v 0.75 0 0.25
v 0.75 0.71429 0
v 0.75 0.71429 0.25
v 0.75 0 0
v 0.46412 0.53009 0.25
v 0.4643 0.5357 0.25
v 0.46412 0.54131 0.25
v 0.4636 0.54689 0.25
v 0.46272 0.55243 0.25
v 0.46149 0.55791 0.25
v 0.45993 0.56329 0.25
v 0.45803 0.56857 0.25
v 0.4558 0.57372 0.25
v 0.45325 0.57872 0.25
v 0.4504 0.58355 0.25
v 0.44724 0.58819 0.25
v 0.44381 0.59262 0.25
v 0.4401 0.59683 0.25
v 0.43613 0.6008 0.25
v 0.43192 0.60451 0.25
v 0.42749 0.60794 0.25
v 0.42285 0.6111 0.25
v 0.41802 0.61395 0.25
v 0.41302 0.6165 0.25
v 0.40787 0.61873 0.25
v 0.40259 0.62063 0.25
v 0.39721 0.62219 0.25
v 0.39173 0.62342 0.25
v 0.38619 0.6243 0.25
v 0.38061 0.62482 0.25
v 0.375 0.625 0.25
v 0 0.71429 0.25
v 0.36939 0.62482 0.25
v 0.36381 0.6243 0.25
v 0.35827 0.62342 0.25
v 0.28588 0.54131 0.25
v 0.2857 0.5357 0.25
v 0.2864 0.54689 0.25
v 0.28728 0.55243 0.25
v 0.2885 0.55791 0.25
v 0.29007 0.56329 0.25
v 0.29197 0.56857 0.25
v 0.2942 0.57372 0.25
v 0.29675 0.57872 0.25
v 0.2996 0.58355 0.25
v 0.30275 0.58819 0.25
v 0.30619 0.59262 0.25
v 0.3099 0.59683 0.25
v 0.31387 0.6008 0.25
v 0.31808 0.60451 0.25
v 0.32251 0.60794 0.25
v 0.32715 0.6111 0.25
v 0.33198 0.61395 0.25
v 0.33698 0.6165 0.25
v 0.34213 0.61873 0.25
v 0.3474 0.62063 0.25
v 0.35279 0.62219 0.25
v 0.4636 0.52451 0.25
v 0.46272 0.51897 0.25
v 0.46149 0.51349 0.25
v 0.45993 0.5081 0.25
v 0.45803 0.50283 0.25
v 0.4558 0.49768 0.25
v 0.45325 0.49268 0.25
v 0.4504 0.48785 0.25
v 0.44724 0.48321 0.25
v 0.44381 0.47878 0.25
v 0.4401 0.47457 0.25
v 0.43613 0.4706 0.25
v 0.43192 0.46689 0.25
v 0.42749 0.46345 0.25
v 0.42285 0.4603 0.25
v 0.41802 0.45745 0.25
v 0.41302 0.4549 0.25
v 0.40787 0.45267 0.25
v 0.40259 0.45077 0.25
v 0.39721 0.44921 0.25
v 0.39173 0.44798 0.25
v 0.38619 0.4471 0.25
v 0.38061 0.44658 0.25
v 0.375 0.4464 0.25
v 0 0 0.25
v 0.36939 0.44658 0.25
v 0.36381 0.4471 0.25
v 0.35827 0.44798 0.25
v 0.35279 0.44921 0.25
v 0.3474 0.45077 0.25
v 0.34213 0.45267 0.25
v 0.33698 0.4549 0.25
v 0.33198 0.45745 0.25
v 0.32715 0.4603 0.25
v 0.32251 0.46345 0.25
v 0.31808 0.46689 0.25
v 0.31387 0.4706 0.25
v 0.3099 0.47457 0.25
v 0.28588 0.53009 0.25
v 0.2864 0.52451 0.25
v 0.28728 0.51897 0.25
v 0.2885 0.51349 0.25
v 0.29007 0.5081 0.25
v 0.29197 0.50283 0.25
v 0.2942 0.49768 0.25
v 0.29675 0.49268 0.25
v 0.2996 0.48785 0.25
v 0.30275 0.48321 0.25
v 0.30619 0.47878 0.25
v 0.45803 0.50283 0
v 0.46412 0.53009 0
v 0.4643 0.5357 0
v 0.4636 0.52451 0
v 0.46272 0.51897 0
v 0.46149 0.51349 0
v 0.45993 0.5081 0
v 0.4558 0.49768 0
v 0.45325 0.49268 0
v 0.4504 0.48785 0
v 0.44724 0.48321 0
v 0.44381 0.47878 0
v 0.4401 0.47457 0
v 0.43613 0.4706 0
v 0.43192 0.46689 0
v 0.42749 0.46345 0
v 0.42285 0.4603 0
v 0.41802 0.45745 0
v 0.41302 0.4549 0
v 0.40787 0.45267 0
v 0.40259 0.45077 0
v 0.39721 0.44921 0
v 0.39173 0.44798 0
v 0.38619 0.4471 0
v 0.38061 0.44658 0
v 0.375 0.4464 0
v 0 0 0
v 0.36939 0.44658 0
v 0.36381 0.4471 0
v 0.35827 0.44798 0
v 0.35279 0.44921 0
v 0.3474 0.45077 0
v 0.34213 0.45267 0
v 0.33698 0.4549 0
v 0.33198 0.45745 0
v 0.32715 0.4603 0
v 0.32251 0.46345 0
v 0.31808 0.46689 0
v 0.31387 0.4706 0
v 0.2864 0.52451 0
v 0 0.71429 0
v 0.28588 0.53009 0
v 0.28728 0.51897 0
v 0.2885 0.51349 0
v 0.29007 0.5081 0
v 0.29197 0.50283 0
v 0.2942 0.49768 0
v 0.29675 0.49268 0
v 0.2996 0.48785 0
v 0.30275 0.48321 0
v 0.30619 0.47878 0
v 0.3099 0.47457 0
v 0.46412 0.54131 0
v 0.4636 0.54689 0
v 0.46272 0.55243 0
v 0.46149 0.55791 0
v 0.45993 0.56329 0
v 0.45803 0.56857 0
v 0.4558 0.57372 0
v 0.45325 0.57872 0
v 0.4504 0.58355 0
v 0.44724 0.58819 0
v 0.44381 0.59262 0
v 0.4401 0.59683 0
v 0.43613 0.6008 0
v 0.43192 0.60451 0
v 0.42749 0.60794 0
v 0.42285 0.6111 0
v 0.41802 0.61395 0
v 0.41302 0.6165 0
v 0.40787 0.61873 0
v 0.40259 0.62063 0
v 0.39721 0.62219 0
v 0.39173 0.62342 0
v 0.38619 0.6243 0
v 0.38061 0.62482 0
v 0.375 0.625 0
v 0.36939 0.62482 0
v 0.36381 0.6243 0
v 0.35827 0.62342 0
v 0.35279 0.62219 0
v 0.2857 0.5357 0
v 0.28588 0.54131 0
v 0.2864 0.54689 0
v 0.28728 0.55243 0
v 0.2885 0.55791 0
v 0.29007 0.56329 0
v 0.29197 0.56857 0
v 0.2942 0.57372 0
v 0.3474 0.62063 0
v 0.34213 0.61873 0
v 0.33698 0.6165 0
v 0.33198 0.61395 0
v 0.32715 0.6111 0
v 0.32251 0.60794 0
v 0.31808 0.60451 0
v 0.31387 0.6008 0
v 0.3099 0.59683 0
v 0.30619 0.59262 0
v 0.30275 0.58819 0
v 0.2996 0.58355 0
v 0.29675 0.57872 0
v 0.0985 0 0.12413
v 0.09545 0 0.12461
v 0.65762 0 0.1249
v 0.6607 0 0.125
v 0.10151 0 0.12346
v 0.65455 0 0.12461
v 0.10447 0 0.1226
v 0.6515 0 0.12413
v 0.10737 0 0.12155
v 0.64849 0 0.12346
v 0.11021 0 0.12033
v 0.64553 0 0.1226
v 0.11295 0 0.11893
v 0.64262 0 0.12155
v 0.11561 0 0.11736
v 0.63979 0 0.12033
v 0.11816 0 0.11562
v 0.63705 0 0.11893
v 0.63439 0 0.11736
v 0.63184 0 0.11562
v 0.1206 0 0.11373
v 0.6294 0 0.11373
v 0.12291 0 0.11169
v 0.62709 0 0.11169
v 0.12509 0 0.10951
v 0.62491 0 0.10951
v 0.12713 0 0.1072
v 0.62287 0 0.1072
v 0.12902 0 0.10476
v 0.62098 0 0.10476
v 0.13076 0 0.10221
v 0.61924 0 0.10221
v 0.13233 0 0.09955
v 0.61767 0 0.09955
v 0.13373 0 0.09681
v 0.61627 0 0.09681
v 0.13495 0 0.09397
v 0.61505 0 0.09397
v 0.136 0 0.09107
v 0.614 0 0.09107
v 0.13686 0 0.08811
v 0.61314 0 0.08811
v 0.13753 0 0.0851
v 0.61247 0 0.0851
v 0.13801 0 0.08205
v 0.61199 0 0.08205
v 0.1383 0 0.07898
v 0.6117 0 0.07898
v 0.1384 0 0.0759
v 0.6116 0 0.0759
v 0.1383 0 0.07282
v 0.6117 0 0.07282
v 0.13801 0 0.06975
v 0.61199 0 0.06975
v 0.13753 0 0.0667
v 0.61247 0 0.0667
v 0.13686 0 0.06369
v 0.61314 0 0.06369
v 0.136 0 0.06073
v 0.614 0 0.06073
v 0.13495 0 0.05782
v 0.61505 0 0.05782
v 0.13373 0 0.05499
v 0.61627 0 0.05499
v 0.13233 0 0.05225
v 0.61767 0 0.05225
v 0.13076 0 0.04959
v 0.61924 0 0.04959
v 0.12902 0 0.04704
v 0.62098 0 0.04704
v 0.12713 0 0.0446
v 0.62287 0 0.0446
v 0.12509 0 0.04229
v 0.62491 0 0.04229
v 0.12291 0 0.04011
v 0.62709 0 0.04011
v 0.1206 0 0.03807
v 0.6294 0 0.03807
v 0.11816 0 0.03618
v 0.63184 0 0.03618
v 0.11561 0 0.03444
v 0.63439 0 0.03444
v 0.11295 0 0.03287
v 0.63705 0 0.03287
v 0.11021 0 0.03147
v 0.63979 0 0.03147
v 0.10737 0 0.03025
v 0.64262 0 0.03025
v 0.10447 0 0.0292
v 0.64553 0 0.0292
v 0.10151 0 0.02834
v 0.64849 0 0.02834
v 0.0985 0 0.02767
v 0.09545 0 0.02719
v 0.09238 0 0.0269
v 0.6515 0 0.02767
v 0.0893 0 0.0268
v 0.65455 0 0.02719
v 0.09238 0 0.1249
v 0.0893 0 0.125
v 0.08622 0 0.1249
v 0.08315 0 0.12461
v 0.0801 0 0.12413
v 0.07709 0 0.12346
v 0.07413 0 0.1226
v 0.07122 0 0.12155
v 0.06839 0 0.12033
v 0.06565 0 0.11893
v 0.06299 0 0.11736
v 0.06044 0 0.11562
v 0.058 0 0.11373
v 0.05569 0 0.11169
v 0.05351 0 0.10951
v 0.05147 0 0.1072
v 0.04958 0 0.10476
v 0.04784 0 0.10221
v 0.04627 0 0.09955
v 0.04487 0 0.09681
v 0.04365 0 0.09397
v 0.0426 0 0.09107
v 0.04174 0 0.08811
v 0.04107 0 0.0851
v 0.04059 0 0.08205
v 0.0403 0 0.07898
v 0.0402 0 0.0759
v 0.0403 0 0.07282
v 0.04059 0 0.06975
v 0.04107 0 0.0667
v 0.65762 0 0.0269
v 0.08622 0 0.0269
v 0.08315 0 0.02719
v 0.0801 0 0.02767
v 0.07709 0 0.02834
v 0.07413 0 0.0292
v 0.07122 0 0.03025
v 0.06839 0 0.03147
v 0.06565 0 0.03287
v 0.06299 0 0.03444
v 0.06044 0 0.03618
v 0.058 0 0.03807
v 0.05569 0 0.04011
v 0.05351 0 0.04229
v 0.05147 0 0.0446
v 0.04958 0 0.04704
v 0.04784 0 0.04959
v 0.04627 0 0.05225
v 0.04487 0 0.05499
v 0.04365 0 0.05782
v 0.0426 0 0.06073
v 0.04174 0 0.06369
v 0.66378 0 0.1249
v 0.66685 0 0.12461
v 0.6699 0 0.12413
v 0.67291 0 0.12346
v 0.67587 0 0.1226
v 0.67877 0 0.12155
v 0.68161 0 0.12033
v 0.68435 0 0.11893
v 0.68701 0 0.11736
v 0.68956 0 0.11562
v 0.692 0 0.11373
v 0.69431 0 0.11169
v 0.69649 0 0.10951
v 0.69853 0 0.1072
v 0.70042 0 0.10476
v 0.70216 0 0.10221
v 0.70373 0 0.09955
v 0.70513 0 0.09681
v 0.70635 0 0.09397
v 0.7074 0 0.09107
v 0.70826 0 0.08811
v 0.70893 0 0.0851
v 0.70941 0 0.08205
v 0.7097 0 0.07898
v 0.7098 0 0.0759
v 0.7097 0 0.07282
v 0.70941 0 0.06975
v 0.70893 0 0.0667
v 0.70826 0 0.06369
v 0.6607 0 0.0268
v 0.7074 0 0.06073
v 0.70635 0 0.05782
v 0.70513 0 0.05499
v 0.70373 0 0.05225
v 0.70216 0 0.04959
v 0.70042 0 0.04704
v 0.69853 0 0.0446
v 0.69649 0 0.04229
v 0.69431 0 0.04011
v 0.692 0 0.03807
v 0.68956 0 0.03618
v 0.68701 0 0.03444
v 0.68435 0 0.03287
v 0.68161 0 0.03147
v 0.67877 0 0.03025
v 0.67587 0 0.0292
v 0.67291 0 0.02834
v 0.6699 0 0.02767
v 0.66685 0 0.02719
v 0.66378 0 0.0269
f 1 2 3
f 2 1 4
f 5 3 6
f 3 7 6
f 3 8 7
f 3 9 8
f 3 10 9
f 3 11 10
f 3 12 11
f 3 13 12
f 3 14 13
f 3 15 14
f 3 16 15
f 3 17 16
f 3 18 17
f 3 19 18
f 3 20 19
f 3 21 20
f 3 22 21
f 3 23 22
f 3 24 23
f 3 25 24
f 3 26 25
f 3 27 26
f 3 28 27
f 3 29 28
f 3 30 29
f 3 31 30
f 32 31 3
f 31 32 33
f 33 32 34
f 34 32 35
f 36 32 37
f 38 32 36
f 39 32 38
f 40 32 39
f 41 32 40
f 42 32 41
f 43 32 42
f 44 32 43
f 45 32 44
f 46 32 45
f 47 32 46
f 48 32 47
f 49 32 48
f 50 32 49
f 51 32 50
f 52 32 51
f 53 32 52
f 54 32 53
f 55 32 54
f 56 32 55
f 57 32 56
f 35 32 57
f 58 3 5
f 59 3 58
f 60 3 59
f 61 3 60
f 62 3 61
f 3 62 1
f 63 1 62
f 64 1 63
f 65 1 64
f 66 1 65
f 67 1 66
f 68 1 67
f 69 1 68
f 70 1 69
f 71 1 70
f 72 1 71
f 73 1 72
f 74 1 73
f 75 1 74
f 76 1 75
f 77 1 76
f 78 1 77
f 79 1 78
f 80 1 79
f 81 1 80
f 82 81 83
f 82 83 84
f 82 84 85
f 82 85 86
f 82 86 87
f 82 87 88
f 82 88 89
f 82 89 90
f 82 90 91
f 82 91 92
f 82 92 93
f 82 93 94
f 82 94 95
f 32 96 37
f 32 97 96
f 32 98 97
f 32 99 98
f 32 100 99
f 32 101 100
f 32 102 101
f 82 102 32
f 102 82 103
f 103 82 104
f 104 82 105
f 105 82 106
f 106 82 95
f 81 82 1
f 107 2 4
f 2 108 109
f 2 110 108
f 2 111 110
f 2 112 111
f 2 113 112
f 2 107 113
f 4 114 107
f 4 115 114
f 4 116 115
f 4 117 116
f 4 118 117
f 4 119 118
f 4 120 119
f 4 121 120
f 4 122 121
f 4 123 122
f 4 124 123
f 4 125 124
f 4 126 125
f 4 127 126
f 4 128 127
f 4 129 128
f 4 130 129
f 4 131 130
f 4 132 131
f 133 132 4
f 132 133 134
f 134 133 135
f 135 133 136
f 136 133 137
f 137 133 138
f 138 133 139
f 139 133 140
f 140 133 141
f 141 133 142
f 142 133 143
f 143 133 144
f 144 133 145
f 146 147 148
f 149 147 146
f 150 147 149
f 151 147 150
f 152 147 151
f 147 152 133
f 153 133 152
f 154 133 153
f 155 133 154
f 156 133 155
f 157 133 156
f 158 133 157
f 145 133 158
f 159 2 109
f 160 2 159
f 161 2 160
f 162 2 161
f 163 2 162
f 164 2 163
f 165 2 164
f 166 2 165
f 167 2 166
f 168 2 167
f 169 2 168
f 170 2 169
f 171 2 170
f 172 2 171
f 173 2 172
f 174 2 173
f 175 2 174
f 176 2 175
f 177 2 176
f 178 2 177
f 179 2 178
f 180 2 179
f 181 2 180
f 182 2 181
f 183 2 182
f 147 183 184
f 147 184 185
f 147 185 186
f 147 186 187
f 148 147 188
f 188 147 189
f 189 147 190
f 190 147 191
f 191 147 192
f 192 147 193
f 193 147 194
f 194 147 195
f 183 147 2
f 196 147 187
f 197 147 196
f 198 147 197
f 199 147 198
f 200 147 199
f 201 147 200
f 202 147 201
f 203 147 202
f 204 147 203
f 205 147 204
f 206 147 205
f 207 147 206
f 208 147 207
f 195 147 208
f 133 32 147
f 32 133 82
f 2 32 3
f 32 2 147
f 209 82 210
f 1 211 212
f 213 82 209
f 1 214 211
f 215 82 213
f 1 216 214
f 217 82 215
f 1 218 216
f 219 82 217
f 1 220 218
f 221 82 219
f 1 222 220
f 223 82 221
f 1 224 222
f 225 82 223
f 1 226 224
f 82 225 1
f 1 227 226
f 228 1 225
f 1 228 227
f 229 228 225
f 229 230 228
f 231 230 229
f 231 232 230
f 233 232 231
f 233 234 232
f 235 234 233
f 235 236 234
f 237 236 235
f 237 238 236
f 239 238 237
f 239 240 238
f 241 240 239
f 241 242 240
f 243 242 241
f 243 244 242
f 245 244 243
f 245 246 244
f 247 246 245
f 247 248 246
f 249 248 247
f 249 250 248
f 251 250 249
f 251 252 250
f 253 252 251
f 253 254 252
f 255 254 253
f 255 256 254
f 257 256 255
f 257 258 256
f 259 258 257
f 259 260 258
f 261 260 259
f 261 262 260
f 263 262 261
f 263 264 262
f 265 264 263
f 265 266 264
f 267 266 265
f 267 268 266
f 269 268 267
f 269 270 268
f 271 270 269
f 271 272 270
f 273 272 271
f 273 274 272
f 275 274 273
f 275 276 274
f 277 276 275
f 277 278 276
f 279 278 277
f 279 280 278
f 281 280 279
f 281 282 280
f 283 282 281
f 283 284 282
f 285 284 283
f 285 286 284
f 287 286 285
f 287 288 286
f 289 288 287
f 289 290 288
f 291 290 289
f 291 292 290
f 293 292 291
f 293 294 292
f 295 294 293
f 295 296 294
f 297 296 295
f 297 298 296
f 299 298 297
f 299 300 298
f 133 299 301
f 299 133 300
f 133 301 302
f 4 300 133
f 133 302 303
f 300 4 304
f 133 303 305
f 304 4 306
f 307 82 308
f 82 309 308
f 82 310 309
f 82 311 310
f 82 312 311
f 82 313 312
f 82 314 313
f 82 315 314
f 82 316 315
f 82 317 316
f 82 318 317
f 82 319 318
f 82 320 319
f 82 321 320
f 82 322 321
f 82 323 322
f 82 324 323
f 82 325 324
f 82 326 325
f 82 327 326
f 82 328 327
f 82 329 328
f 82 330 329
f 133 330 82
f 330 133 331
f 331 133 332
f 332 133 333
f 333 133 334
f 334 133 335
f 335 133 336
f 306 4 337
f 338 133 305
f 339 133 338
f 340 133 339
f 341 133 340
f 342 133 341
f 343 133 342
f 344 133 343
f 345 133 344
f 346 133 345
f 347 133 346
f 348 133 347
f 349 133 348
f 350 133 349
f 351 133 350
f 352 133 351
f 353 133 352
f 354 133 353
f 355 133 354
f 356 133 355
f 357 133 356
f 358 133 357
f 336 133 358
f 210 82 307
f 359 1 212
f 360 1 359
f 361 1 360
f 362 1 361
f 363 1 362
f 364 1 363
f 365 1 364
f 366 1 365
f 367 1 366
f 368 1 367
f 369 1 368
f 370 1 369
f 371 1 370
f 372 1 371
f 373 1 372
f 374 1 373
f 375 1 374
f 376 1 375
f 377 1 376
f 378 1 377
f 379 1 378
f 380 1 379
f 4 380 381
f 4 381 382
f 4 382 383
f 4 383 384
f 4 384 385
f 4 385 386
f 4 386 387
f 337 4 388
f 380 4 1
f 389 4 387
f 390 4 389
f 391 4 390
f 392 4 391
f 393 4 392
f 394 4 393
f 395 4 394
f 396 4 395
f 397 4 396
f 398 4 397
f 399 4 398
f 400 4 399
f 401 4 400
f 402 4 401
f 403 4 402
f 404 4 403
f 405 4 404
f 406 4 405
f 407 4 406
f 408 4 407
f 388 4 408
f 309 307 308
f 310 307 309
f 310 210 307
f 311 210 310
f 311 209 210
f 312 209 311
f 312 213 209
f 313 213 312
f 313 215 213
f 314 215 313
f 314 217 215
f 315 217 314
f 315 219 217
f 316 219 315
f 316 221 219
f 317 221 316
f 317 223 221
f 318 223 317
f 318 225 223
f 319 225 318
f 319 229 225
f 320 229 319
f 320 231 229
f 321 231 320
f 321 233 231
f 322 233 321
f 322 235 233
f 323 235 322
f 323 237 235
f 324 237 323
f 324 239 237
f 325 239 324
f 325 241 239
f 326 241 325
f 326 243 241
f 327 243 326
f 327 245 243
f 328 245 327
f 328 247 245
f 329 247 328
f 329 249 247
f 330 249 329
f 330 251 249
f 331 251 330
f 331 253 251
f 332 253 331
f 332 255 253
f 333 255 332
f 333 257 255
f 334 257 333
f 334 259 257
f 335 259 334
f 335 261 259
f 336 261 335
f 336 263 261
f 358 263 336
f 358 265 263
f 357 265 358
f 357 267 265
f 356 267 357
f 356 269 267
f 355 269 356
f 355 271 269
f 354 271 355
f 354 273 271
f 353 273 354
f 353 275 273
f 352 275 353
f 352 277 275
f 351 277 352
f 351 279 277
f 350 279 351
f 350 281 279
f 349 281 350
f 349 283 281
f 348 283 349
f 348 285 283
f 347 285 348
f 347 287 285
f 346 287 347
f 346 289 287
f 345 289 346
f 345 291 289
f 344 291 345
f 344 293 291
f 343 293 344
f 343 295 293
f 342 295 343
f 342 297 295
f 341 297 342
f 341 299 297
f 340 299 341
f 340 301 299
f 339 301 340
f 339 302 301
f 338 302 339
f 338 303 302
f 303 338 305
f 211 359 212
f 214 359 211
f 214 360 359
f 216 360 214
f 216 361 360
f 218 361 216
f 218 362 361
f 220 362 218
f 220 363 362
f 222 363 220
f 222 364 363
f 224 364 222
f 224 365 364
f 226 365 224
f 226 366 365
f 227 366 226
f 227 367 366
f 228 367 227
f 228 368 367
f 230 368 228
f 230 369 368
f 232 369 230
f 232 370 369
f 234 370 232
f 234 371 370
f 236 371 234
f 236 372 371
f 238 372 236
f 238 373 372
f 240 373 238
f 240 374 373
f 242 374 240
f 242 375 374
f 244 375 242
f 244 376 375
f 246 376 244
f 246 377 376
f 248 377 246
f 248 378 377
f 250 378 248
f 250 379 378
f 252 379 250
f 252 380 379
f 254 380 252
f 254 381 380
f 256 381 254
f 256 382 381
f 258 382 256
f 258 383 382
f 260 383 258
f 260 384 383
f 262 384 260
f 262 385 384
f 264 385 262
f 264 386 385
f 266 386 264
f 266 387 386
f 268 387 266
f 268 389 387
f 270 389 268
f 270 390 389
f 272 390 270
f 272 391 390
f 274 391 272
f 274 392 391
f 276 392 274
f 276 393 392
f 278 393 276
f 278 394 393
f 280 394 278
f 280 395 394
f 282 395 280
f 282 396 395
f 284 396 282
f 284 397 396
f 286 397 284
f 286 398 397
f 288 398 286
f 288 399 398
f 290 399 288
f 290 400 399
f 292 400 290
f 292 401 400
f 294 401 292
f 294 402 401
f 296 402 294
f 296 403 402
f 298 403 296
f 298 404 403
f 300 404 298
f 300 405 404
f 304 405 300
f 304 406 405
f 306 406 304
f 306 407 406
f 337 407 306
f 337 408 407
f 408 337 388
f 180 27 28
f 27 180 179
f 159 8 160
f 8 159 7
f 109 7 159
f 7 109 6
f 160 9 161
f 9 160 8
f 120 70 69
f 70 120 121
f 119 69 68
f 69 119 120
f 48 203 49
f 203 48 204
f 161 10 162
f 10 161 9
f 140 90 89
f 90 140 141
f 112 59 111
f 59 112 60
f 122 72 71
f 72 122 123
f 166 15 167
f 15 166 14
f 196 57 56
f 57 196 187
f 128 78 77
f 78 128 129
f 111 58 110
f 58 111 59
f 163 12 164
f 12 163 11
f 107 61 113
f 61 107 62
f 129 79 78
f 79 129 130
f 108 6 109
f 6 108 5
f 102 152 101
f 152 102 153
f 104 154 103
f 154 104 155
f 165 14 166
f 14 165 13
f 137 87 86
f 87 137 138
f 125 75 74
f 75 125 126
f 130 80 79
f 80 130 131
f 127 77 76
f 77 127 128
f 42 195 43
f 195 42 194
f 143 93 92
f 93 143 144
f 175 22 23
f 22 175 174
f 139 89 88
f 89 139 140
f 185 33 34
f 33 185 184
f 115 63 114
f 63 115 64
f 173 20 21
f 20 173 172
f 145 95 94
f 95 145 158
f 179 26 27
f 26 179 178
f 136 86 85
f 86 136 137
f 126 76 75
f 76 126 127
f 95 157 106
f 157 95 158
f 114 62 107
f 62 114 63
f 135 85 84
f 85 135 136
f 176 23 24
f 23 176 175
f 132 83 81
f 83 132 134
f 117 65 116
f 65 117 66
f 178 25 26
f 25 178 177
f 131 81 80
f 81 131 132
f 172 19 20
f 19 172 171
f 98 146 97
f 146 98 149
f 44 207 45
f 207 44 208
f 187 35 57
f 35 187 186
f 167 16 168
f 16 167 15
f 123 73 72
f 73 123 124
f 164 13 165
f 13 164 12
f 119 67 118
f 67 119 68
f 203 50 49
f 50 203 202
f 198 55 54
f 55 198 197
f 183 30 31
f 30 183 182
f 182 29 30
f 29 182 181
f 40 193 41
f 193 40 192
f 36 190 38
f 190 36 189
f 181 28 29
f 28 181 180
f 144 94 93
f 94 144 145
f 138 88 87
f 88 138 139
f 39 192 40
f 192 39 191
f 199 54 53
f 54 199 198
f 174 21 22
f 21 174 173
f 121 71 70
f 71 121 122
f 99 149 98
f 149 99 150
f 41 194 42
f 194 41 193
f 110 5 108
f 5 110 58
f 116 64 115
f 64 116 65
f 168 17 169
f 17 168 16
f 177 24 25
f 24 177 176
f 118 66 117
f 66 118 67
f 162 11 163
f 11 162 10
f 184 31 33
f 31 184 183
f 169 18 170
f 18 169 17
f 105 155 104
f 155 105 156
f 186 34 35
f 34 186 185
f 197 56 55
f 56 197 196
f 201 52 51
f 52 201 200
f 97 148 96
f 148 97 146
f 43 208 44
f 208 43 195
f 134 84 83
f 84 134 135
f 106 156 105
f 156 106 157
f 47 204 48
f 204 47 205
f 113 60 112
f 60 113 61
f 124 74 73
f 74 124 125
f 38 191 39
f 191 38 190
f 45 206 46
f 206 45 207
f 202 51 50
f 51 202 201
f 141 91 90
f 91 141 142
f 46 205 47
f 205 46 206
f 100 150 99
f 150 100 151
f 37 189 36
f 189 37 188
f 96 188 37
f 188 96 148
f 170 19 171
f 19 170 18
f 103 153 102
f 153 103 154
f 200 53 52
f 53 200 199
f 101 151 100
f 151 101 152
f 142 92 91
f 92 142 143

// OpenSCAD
// Parameters
length = 0.75;
width = 0.714286;
height = 0.25;
extrusion_depth = 0.25;

// Upper through-opening parameters
through_x = 0.375;
through_y = 0.5357;
through_radius = 0.0893;

// Front side blind hole parameters
blind_radius = 0.0491;
blind_depth = 0.1071;
blind_z_min = 0.0759;
blind_z_max = 0.1741;
blind_x1 = 0.0893;
blind_x2 = 0.6607;

$fn = 100; // Smooth circles

// Main stepped block
module main_block() {
    // Create the main rectangular block
    cube([length, width, extrusion_depth]);
}

// Upper through-opening
module through_hole() {
    // Circular hole through entire height
    translate([through_x, through_y, 0])
        cylinder(h = extrusion_depth + 0.001, r = through_radius, center = false);
}

// Front side blind hole (single instance)
module blind_hole(x_pos) {
    // Position on front face (y=0) with limited z range
    translate([x_pos, 0, blind_z_min])
        rotate([90, 0, 0])
            cylinder(h = blind_depth, r = blind_radius, center = false);
}

// Main model
difference() {
    // Solid base
    main_block();
    
    // Subtract upper through-opening
    through_hole();
    
    // Subtract front blind holes
    blind_hole(blind_x1);
    blind_hole(blind_x2);
}
